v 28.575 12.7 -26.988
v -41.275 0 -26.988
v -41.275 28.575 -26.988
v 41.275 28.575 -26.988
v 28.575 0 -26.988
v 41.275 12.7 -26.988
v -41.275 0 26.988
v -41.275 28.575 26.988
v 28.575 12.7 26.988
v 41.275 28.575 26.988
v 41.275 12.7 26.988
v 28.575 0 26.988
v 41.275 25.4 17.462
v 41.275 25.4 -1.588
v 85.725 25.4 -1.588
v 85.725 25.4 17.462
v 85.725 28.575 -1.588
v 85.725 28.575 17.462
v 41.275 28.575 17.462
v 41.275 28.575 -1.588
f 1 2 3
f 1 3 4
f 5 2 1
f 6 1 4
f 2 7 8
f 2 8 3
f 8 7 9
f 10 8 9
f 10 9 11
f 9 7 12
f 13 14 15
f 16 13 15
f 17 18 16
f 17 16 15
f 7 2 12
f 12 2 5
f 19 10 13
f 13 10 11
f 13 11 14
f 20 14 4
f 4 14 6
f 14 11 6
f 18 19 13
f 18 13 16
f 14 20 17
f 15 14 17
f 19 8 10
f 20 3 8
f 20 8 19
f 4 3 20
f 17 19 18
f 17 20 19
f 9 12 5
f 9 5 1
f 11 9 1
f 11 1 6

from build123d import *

# Parameters (mm, degrees)
SKETCH1_W           = 82.55
SKETCH1_H           = 53.975
BOSS_EXTRUDE1_DEPTH = 28.575
SKETCH2_W           = 12.7
SKETCH2_H           = 12.7
CUT_EXTRUDE1_DEPTH  = 54.975
SKETCH3_W           = 44.45
SKETCH3_H           = 19.05
BOSS_EXTRUDE2_DEPTH = 3.175


with BuildPart() as part:
    # Sketch1 → Boss-Extrude1 (new body)
    with BuildSketch(Plane(origin=(0, 0, 0), x_dir=(1, 0, 0), z_dir=(0, 1, 0))):
        Rectangle(SKETCH1_W, SKETCH1_H)
    extrude(amount=BOSS_EXTRUDE1_DEPTH)

    # Sketch2 → Cut-Extrude1 (cut, through all)
    with BuildSketch(Plane.XY.offset(26.9875)):
        with Locations((34.925, 6.35)):
            Rectangle(SKETCH2_W, SKETCH2_H)
    extrude(amount=-CUT_EXTRUDE1_DEPTH, mode=Mode.SUBTRACT)

    # Sketch3 → Boss-Extrude2 (add)
    with BuildSketch(Plane(origin=(0, 28.575, 0), x_dir=(1, 0, 0), z_dir=(0, 1, 0))):
        with Locations((63.5, -7.9375)):
            Rectangle(SKETCH3_W, SKETCH3_H)
    extrude(amount=-BOSS_EXTRUDE2_DEPTH)


solid = part.part
